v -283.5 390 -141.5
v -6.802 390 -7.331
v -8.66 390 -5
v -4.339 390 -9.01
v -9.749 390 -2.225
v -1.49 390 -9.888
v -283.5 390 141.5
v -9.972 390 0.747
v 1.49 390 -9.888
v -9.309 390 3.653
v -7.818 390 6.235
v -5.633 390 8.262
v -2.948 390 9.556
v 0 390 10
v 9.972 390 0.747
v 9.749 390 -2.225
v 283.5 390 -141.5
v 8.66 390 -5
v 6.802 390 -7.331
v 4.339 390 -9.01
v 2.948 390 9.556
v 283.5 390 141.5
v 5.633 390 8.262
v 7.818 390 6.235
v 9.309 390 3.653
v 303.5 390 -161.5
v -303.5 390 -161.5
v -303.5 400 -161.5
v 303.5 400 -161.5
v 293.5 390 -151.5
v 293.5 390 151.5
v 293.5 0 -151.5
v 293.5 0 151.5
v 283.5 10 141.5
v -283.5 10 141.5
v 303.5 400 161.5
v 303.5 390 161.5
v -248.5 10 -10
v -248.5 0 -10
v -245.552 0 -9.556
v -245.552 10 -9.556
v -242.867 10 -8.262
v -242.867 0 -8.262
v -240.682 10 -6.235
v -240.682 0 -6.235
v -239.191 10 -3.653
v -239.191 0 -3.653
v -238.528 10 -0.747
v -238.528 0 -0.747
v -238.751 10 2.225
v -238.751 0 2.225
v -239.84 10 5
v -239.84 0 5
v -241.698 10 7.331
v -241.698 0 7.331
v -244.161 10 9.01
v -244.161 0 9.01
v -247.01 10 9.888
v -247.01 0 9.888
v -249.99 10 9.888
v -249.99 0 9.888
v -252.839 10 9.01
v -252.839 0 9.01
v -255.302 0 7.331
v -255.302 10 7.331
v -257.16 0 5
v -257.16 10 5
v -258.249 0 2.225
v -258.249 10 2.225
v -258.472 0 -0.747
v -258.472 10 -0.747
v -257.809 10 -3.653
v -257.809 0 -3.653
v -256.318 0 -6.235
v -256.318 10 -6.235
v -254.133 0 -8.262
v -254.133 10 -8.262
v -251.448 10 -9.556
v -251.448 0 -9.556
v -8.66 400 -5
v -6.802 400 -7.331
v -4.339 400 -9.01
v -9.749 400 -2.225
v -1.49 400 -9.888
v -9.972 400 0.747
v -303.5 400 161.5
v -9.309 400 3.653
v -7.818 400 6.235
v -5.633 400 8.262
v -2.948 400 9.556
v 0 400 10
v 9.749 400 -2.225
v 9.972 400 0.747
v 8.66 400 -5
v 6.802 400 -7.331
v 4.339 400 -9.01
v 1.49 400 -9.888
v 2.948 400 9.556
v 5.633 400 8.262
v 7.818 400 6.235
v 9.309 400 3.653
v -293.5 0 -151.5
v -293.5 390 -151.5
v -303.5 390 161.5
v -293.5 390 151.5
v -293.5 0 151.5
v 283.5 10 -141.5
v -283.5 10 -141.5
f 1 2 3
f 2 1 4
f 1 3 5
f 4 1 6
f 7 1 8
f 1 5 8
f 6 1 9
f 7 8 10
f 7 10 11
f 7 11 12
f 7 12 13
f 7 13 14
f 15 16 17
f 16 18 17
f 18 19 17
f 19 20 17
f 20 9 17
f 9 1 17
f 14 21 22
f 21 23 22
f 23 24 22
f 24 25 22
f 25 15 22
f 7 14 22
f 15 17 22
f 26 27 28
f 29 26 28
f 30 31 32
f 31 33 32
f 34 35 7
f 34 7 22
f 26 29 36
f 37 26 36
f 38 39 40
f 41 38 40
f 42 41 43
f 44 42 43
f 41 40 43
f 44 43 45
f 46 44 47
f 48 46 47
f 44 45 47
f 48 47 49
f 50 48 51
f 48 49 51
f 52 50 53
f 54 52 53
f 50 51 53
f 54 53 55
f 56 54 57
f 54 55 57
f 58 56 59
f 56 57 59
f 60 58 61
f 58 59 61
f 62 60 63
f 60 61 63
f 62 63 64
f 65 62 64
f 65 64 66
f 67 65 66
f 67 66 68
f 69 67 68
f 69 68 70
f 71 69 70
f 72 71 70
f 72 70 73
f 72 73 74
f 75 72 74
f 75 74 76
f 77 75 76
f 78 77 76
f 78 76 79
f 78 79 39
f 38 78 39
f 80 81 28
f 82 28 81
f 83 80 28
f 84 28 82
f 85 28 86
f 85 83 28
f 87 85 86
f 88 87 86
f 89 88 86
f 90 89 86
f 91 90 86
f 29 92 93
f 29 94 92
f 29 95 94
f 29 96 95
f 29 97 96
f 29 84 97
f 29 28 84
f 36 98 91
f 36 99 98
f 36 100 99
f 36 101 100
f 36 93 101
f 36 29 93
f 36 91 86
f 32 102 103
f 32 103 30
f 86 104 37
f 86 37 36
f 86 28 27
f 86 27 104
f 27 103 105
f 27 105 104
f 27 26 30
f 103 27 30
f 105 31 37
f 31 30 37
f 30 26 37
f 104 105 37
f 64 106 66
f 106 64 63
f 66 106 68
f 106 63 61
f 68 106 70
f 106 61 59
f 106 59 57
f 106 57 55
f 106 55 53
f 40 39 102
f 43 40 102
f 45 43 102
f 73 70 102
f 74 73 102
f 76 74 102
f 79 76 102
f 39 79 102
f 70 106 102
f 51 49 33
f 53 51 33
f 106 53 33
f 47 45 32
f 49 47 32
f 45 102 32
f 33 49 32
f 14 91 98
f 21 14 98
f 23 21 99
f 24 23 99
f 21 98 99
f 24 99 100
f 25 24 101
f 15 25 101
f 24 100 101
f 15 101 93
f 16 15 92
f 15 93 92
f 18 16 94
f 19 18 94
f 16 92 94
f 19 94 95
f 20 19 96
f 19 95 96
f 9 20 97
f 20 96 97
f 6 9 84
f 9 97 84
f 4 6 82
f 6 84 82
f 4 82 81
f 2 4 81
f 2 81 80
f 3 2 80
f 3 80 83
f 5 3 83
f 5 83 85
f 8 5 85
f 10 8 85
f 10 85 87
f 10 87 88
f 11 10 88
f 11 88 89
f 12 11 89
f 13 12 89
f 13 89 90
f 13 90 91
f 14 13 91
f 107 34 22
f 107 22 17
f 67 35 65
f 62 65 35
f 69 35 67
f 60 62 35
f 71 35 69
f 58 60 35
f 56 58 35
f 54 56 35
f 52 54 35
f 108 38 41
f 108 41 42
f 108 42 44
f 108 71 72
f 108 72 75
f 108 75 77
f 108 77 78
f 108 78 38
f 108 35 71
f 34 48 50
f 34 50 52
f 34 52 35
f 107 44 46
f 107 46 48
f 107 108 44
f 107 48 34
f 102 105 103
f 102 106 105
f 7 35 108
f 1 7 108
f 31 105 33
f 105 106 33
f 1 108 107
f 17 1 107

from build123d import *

# Parameters (mm, degrees)
SKETCH2_W      = 587
SKETCH2_H      = 303
BASE_DEPTH     = 10
SKETCH4_W      = 587
SKETCH4_H      = 303
SKETCH4_W_2    = 567
SKETCH4_H_2    = 283
WALLS_DEPTH    = 380
LID_DEPTH      = 10
LID_DEPTH_BACK = 597
SKETCH5_W      = 323
SKETCH5_H      = 10
INLET_REACH    = 529.441
SKETCH8_R      = 10
OUTLET_REACH   = 529.441
SKETCH9_R      = 10


with BuildPart() as part:
    # Sketch2 → Base (new body)
    with BuildSketch(Plane(origin=(0, 0, 0), x_dir=(1, 0, 0), z_dir=(0, 1, 0))):
        Rectangle(SKETCH2_W, SKETCH2_H)
    extrude(amount=BASE_DEPTH)

    # Sketch4 → Walls (add)
    with BuildSketch(Plane(origin=(0, 10, 0), x_dir=(1, 0, 0), z_dir=(0, 1, 0))):
        Rectangle(SKETCH4_W, SKETCH4_H)
        Rectangle(SKETCH4_W_2, SKETCH4_H_2, mode=Mode.SUBTRACT)
    extrude(amount=WALLS_DEPTH)

    # Sketch5 → Lid (add, two sides: drawn at the far end of the back side and taken through both)
    with BuildSketch(Plane.ZY.offset(293.5).offset(-LID_DEPTH_BACK)):
        with Locations((0, 395)):
            Rectangle(SKETCH5_W, SKETCH5_H)
    extrude(amount=LID_DEPTH + LID_DEPTH_BACK)

    # Sketch8 → Inlet (cut, up to next)
    with BuildSketch(Plane(origin=(0, 400, 0), x_dir=(1, 0, 0), z_dir=(0, 1, 0)), mode=Mode.PRIVATE) as inlet_sk1:
        with Locations(Location((0, 0, 0), (0, 0, 270))):
            Circle(SKETCH8_R)
    inlet_tool1 = extrude(inlet_sk1.sketch, amount=-INLET_REACH, mode=Mode.PRIVATE) & part.part
    add(inlet_tool1.solids().sort_by_distance((0, 400, 0))[0], mode=Mode.SUBTRACT)

    # Sketch9 → Outlet (cut, up to next)
    with BuildSketch(Plane.XZ, mode=Mode.PRIVATE) as outlet_sk1:
        with Locations(Location((-248.5, 0, 0), (0, 0, 270))):
            Circle(SKETCH9_R)
    outlet_tool1 = extrude(outlet_sk1.sketch, amount=-OUTLET_REACH, mode=Mode.PRIVATE) & part.part
    add(outlet_tool1.solids().sort_by_distance((-248.5, 0, 0))[0], mode=Mode.SUBTRACT)


solid = part.part
